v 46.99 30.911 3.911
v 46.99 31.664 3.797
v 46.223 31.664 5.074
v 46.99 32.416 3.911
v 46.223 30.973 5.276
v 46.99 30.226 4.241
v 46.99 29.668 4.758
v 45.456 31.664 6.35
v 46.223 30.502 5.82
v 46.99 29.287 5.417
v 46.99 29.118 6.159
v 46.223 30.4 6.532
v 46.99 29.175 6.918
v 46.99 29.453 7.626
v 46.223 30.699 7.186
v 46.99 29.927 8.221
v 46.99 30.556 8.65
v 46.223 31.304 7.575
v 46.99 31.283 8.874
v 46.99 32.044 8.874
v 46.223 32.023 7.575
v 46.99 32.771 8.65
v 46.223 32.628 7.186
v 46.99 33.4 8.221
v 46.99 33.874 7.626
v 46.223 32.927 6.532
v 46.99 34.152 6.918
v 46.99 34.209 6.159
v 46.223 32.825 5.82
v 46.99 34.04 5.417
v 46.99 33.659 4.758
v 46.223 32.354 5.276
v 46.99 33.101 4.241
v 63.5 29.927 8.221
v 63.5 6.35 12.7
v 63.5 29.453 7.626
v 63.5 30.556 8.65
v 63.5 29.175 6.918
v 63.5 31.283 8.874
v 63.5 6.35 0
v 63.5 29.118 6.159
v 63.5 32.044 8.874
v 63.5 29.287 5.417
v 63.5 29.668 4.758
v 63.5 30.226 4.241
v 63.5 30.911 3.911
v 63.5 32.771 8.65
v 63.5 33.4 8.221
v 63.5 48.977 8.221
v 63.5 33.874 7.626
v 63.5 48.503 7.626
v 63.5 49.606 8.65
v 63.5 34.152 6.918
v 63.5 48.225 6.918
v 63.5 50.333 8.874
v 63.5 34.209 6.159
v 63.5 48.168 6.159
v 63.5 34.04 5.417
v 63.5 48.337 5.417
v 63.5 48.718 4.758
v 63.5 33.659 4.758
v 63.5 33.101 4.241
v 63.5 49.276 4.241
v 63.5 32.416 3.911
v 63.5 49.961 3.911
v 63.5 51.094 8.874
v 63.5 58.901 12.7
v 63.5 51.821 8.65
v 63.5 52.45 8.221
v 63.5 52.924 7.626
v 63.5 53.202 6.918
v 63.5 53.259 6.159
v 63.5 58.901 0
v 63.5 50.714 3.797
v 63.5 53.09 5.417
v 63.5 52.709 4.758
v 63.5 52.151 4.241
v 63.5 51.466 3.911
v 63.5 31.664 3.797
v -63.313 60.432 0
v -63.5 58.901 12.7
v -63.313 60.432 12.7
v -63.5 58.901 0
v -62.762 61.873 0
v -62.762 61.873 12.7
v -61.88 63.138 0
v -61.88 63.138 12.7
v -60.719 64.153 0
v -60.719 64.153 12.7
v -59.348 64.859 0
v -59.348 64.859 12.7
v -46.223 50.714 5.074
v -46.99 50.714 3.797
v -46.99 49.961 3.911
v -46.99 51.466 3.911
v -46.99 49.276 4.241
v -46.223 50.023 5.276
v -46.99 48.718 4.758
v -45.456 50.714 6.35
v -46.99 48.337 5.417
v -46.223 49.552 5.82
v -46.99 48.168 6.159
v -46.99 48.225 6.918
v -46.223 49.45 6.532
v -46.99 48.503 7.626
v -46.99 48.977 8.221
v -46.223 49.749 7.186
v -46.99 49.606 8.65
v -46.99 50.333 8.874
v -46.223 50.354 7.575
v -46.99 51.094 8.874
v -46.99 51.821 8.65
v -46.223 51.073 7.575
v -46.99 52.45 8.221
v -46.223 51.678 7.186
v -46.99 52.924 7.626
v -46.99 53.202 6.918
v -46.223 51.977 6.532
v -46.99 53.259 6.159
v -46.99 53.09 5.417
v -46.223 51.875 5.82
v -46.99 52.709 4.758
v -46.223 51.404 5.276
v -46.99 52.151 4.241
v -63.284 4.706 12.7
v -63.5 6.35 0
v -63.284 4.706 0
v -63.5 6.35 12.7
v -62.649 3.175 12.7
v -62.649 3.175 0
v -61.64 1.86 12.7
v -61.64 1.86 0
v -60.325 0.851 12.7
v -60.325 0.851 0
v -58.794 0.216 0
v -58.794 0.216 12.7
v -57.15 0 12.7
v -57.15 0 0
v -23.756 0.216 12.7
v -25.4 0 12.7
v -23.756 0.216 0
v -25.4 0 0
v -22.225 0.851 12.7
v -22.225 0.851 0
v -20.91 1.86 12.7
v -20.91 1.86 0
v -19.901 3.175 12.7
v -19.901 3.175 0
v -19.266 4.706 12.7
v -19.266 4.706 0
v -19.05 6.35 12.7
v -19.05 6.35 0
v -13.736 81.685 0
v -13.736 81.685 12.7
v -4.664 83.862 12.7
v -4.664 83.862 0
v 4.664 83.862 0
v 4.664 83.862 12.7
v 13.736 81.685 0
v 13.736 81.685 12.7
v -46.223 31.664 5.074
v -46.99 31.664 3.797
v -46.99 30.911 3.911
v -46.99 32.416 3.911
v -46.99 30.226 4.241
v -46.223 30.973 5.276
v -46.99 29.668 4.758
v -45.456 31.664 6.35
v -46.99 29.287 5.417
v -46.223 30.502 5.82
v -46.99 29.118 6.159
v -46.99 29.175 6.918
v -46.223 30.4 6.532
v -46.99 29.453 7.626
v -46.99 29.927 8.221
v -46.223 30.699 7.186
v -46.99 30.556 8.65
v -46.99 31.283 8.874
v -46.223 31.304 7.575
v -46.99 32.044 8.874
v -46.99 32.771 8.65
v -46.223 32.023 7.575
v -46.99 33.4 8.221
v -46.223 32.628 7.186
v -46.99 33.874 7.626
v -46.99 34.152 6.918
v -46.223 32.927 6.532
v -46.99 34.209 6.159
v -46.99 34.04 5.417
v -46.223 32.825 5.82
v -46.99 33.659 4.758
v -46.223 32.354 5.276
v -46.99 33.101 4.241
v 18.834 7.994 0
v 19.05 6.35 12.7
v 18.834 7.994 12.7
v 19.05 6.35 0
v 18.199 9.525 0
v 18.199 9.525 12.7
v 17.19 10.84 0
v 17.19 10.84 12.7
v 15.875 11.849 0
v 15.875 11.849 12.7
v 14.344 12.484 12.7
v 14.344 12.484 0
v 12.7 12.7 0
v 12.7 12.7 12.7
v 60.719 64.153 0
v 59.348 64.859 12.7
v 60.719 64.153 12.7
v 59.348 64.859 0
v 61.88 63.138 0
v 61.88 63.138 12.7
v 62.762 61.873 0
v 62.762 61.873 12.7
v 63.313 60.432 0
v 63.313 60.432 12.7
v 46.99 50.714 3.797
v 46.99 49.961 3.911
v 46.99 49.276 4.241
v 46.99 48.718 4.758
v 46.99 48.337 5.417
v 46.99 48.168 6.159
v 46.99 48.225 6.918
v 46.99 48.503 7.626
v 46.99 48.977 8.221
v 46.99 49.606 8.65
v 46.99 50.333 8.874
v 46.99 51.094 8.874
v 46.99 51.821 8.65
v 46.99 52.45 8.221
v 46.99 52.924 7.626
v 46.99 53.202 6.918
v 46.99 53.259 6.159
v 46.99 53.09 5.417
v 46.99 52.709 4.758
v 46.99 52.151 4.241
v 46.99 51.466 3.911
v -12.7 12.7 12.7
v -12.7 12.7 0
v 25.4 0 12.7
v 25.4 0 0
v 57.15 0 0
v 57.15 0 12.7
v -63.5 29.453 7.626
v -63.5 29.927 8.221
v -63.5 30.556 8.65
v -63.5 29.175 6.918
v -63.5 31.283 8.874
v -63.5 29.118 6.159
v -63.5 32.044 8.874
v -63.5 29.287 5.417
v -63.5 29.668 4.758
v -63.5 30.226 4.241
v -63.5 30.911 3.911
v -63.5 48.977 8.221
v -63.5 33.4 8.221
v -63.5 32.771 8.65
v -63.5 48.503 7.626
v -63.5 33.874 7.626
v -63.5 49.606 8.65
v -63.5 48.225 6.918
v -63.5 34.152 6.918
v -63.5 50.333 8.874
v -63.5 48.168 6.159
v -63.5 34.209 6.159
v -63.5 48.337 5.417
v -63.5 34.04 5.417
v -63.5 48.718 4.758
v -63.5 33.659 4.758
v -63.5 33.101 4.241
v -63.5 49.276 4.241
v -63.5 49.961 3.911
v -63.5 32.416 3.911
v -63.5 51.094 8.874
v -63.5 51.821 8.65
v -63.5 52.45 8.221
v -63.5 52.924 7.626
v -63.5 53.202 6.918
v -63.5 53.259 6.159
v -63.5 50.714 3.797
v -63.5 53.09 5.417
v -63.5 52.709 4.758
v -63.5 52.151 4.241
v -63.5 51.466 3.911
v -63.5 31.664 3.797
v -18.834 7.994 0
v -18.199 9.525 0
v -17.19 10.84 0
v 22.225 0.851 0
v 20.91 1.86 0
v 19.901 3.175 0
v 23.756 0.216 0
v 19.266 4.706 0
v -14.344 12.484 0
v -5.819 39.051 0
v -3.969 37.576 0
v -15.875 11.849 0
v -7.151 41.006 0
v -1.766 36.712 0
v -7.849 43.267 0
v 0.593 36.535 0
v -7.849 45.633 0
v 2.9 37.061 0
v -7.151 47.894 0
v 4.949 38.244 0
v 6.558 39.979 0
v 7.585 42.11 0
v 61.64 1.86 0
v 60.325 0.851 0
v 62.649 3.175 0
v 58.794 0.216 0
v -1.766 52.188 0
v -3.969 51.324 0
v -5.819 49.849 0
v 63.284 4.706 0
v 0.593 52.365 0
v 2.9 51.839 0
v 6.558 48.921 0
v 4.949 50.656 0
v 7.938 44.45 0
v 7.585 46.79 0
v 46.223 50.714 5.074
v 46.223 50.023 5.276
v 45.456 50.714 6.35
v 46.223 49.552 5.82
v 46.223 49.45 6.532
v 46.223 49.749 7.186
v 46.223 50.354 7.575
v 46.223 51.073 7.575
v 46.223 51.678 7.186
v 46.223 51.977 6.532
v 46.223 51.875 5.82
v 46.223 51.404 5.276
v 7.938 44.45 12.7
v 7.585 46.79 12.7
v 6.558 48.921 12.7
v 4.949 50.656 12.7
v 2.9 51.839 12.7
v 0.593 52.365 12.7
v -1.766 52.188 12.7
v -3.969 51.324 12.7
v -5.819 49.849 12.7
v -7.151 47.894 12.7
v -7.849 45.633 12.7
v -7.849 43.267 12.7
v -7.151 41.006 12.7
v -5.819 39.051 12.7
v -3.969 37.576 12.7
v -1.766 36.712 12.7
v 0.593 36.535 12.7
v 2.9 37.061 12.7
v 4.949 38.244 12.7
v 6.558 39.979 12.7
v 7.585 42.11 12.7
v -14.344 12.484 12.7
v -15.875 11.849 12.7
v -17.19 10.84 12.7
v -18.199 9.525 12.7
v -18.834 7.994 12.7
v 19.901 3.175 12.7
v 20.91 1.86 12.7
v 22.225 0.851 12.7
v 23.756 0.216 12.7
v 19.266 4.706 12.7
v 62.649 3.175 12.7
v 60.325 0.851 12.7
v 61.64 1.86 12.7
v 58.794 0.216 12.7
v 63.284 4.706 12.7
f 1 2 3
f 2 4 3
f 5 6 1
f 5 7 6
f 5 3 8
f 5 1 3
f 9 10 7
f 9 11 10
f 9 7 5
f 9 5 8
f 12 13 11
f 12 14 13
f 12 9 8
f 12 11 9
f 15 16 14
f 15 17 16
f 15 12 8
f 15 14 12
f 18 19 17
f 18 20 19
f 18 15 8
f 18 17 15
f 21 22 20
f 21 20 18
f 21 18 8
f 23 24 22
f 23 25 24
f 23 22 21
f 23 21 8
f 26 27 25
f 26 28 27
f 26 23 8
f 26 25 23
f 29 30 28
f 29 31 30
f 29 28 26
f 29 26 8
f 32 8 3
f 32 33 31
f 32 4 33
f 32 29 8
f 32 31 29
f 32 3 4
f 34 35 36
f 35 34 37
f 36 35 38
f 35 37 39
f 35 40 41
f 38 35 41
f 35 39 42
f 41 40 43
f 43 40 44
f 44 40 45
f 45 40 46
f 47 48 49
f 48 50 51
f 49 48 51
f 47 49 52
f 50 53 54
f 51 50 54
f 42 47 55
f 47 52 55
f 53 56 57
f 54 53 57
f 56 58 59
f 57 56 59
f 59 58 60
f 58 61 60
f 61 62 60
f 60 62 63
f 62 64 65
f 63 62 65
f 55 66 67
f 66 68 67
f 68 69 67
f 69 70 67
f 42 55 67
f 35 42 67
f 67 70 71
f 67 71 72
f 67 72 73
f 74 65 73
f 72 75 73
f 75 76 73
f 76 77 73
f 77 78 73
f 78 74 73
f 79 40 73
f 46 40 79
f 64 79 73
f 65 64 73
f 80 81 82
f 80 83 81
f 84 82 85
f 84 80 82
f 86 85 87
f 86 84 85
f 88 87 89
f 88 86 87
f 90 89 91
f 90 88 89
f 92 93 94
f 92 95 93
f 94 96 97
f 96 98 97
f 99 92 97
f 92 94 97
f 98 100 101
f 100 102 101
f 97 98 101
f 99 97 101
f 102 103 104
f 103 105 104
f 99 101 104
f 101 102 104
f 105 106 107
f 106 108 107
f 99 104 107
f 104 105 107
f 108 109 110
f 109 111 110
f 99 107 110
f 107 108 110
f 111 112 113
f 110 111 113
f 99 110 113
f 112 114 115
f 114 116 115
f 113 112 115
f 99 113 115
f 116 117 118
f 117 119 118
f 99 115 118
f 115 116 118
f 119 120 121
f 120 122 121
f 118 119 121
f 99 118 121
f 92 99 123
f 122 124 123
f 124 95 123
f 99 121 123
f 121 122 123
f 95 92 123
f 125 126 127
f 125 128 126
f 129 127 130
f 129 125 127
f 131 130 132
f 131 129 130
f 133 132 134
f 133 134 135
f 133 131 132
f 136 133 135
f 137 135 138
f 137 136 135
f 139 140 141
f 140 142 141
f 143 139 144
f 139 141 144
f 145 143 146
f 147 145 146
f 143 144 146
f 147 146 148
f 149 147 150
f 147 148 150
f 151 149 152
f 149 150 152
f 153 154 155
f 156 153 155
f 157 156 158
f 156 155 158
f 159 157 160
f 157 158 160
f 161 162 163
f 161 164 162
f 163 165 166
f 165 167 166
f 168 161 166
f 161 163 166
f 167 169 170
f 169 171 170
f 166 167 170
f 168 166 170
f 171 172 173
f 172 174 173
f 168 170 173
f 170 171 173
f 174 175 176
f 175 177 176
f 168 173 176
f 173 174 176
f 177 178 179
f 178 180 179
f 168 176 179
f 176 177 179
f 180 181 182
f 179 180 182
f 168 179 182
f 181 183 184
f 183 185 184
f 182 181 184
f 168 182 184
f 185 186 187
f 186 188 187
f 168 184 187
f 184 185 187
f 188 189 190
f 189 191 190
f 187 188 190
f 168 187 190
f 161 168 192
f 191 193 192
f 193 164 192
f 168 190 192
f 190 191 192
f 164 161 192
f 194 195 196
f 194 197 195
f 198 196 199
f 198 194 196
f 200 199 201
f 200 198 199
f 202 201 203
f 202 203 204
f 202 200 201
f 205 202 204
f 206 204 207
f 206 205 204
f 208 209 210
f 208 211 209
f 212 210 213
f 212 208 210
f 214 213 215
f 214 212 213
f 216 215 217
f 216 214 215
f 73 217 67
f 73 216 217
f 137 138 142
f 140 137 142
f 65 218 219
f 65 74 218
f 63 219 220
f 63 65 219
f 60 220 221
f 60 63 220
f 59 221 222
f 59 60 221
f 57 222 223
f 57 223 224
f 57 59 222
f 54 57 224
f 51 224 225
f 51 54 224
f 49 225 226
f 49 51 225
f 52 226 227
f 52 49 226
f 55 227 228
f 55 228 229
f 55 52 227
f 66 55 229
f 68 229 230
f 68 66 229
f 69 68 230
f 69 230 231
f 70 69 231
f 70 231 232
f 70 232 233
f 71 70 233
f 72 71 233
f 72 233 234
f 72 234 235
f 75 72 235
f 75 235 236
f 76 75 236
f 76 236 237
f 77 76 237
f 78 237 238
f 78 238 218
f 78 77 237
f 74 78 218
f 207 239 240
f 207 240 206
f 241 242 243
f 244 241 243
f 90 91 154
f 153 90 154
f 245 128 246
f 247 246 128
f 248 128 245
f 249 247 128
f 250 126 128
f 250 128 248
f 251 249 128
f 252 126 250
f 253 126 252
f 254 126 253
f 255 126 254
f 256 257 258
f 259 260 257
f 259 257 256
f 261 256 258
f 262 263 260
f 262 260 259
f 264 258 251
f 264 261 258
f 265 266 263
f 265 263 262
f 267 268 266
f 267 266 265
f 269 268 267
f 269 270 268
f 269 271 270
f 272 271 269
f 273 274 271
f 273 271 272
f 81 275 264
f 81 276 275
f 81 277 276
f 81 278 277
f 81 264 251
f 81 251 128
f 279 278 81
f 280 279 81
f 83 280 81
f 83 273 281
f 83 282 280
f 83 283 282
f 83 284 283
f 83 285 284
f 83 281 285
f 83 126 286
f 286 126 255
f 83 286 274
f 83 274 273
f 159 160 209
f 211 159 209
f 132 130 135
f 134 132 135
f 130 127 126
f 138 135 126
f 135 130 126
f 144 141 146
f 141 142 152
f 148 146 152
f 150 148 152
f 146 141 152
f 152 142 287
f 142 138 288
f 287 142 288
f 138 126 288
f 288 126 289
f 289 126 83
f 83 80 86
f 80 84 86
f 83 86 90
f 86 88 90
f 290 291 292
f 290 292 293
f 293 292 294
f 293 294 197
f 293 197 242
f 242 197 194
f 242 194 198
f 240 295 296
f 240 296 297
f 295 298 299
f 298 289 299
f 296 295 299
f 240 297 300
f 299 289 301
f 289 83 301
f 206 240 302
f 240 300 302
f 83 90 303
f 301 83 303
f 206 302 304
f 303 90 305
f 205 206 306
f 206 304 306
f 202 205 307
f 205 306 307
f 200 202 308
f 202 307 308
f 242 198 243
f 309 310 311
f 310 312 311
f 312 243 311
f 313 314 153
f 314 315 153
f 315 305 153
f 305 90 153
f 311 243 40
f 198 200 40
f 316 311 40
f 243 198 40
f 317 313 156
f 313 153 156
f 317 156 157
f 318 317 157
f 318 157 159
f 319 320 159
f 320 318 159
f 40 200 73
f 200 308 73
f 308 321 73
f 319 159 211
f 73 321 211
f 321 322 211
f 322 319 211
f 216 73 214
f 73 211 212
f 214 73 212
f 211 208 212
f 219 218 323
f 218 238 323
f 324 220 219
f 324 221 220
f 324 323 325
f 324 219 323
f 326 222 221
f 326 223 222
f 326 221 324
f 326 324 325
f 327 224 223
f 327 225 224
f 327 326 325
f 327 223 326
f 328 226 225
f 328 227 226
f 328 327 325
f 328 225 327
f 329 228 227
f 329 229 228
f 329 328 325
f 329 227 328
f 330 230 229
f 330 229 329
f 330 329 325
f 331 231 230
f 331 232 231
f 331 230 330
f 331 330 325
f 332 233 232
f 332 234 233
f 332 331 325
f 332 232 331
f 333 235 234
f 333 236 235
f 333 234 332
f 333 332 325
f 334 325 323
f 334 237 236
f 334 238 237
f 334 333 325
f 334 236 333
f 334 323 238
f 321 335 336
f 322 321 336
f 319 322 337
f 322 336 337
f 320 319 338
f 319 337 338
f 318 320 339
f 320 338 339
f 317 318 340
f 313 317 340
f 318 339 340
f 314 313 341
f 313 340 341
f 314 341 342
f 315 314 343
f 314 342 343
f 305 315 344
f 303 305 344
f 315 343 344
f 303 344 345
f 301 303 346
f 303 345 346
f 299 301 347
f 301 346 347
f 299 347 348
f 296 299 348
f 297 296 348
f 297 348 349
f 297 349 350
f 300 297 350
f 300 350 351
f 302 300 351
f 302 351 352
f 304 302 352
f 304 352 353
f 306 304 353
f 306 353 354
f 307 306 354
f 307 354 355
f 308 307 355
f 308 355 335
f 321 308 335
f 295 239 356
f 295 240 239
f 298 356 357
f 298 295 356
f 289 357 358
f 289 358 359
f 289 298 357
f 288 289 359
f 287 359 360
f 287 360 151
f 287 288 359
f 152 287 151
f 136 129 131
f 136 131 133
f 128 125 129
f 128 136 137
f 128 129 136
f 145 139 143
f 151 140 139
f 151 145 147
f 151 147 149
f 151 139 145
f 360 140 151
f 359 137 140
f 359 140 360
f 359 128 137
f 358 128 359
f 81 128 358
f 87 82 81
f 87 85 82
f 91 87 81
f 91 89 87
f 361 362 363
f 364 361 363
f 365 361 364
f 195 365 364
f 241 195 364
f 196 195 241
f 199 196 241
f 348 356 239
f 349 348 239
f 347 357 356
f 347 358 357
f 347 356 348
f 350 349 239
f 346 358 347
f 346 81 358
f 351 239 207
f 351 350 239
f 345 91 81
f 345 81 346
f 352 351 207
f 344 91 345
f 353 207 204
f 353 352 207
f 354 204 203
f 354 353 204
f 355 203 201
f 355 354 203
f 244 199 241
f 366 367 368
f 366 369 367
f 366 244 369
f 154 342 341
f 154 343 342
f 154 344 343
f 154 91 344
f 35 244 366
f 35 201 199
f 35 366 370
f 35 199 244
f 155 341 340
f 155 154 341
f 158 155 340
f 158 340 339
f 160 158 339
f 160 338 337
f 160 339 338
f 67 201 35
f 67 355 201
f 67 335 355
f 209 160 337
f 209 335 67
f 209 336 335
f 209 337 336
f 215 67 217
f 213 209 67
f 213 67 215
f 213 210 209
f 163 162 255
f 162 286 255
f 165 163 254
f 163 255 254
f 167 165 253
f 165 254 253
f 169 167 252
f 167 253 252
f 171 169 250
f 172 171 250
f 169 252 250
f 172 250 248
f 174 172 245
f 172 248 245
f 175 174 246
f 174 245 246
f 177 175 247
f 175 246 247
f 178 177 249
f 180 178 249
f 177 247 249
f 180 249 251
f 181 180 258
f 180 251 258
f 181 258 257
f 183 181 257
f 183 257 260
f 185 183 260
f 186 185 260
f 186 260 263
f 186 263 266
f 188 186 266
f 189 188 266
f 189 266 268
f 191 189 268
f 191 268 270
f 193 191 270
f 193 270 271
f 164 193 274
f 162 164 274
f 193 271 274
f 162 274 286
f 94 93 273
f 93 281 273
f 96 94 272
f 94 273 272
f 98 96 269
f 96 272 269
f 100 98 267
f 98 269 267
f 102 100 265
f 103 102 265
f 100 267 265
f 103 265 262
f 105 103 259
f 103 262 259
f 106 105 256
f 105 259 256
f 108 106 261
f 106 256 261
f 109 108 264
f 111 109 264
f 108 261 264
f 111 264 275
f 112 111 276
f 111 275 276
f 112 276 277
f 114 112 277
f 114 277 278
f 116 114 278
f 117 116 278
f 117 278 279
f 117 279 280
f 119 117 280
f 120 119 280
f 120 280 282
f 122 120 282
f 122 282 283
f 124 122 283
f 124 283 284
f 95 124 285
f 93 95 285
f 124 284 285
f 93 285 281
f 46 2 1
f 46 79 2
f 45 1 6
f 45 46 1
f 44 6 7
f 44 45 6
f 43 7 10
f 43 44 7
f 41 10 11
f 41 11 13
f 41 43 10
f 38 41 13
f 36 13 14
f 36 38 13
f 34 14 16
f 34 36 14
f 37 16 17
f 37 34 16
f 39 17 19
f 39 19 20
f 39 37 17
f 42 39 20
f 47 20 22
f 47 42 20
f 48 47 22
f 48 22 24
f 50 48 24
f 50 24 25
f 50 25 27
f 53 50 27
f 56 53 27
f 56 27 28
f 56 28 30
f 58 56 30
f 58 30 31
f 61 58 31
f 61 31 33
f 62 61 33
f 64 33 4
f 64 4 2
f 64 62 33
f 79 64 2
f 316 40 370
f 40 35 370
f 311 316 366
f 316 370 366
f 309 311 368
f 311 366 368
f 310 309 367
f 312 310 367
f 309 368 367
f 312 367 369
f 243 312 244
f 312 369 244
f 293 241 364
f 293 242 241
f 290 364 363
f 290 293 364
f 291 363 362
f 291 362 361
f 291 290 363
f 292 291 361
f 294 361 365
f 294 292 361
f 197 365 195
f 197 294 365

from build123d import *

# Parameters (mm, degrees)
SKETCH1_W                        = 127
SKETCH1_H                        = 152.4
BOSS_EXTRUDE1_DEPTH              = 12.7
SKETCH2_R                        = 7.9375
CUT_EXTRUDE1_DEPTH               = 166.587741092
F_1_4_20_TAPPED_HOLE1_AT_2_COUNT = 2
F_1_4_20_TAPPED_HOLE1_AT_2_PITCH = 19.05
SKETCH5_W                        = 38.1
SKETCH5_H                        = 12.7
CUT_EXTRUDE2_DEPTH               = 107.172778556
FILLET1_R                        = 6.35


with BuildPart() as part:
    # Sketch1 → Boss-Extrude1 (new body)
    with BuildSketch(Plane.XY):
        with Locations((0, 76.2)):
            Rectangle(SKETCH1_W, SKETCH1_H)
    extrude(amount=BOSS_EXTRUDE1_DEPTH)

    # Sketch2 → Cut-Extrude1 (cut, through all)
    with BuildSketch(Plane.XY.offset(12.7)):
        with BuildLine():
            Line((-63.5, 152.4), (-63.5, 63.327000238))
            Line((-63.5, 63.327000238), (-13.735698541, 81.684771946))
            ThreePointArc((-13.735698541, 81.684771946), (0, 84.1375), (13.735698541, 81.684771946))
            Line((13.735698541, 81.684771946), (63.5, 63.327000238))
            Line((63.5, 63.327000238), (63.5, 152.4))
            Line((63.5, 152.4), (-63.5, 152.4))
        make_face()
        with Locations((0, 44.45)):
            Circle(SKETCH2_R)
    extrude(amount=-CUT_EXTRUDE1_DEPTH, mode=Mode.SUBTRACT)

    # Sketch3 → 1/4-20 Tapped Hole1 (revolve, cut)
    with BuildSketch(Plane(origin=(63.5, 50.713500119, 6.35), x_dir=(0, 0, -1), z_dir=(0, 1, 0))):
        Polygon((0, 0), (0, 18.043816902), (2.5527, 16.51), (2.5527, 0), align=None)
    f_1_4_20_tapped_hole1 = revolve(axis=Axis((69.85, 50.713500119, 6.35), (-1, 0, 0)), mode=Mode.SUBTRACT)

    # 1/4-20 Tapped Hole1 at 2: 1/4-20 Tapped Hole1 ×2
    with Locations(*[(0, -i * F_1_4_20_TAPPED_HOLE1_AT_2_PITCH, 0) for i in range(1, F_1_4_20_TAPPED_HOLE1_AT_2_COUNT)]):
        add(f_1_4_20_tapped_hole1, mode=Mode.SUBTRACT)

    # Mirror1: 1/4-20 Tapped Hole1 across plane
    add(f_1_4_20_tapped_hole1.mirror(Plane(origin=(0, 0, 0), x_dir=(0, 0, 1), z_dir=(1, 0, 0))), mode=Mode.SUBTRACT)

    # Mirror1 copy 1 sketch → Mirror1 copy 1 (revolve, cut)
    with BuildSketch(Plane(origin=(-63.5, 31.663500119, 6.35), x_dir=(0, 0, -1), z_dir=(0, 1, 0))):
        Polygon((0, 0), (0, -18.043816902), (2.5527, -16.51), (2.5527, 0), align=None)
    revolve(axis=Axis((-69.85, 31.663500119, 6.35), (-1, 0, 0)), mode=Mode.SUBTRACT)

    # Sketch5 → Cut-Extrude2 (cut, through all)
    with BuildSketch(Plane.XY.offset(12.7)):
        with Locations((0, 6.35)):
            Rectangle(SKETCH5_W, SKETCH5_H)
    extrude(amount=-CUT_EXTRUDE2_DEPTH, mode=Mode.SUBTRACT)

    # Fillet1
    fillet1_edges = [part.edges().sort_by_distance(p)[0] for p in [
        (-19.05, 12.7, 6.35),
        (19.05, 12.7, 6.35),
        (19.05, 0, 6.35),
        (63.5, 0, 6.35),
        (63.5, 63.327000238, 6.35),
        (-63.5, 0, 6.35),
        (-19.05, 0, 6.35),
        (-63.5, 63.327000238, 6.35),
    ]]
    fillet(fillet1_edges, radius=FILLET1_R - 0.0001)  # a hair under: the kernel refuses the full size


solid = part.part
